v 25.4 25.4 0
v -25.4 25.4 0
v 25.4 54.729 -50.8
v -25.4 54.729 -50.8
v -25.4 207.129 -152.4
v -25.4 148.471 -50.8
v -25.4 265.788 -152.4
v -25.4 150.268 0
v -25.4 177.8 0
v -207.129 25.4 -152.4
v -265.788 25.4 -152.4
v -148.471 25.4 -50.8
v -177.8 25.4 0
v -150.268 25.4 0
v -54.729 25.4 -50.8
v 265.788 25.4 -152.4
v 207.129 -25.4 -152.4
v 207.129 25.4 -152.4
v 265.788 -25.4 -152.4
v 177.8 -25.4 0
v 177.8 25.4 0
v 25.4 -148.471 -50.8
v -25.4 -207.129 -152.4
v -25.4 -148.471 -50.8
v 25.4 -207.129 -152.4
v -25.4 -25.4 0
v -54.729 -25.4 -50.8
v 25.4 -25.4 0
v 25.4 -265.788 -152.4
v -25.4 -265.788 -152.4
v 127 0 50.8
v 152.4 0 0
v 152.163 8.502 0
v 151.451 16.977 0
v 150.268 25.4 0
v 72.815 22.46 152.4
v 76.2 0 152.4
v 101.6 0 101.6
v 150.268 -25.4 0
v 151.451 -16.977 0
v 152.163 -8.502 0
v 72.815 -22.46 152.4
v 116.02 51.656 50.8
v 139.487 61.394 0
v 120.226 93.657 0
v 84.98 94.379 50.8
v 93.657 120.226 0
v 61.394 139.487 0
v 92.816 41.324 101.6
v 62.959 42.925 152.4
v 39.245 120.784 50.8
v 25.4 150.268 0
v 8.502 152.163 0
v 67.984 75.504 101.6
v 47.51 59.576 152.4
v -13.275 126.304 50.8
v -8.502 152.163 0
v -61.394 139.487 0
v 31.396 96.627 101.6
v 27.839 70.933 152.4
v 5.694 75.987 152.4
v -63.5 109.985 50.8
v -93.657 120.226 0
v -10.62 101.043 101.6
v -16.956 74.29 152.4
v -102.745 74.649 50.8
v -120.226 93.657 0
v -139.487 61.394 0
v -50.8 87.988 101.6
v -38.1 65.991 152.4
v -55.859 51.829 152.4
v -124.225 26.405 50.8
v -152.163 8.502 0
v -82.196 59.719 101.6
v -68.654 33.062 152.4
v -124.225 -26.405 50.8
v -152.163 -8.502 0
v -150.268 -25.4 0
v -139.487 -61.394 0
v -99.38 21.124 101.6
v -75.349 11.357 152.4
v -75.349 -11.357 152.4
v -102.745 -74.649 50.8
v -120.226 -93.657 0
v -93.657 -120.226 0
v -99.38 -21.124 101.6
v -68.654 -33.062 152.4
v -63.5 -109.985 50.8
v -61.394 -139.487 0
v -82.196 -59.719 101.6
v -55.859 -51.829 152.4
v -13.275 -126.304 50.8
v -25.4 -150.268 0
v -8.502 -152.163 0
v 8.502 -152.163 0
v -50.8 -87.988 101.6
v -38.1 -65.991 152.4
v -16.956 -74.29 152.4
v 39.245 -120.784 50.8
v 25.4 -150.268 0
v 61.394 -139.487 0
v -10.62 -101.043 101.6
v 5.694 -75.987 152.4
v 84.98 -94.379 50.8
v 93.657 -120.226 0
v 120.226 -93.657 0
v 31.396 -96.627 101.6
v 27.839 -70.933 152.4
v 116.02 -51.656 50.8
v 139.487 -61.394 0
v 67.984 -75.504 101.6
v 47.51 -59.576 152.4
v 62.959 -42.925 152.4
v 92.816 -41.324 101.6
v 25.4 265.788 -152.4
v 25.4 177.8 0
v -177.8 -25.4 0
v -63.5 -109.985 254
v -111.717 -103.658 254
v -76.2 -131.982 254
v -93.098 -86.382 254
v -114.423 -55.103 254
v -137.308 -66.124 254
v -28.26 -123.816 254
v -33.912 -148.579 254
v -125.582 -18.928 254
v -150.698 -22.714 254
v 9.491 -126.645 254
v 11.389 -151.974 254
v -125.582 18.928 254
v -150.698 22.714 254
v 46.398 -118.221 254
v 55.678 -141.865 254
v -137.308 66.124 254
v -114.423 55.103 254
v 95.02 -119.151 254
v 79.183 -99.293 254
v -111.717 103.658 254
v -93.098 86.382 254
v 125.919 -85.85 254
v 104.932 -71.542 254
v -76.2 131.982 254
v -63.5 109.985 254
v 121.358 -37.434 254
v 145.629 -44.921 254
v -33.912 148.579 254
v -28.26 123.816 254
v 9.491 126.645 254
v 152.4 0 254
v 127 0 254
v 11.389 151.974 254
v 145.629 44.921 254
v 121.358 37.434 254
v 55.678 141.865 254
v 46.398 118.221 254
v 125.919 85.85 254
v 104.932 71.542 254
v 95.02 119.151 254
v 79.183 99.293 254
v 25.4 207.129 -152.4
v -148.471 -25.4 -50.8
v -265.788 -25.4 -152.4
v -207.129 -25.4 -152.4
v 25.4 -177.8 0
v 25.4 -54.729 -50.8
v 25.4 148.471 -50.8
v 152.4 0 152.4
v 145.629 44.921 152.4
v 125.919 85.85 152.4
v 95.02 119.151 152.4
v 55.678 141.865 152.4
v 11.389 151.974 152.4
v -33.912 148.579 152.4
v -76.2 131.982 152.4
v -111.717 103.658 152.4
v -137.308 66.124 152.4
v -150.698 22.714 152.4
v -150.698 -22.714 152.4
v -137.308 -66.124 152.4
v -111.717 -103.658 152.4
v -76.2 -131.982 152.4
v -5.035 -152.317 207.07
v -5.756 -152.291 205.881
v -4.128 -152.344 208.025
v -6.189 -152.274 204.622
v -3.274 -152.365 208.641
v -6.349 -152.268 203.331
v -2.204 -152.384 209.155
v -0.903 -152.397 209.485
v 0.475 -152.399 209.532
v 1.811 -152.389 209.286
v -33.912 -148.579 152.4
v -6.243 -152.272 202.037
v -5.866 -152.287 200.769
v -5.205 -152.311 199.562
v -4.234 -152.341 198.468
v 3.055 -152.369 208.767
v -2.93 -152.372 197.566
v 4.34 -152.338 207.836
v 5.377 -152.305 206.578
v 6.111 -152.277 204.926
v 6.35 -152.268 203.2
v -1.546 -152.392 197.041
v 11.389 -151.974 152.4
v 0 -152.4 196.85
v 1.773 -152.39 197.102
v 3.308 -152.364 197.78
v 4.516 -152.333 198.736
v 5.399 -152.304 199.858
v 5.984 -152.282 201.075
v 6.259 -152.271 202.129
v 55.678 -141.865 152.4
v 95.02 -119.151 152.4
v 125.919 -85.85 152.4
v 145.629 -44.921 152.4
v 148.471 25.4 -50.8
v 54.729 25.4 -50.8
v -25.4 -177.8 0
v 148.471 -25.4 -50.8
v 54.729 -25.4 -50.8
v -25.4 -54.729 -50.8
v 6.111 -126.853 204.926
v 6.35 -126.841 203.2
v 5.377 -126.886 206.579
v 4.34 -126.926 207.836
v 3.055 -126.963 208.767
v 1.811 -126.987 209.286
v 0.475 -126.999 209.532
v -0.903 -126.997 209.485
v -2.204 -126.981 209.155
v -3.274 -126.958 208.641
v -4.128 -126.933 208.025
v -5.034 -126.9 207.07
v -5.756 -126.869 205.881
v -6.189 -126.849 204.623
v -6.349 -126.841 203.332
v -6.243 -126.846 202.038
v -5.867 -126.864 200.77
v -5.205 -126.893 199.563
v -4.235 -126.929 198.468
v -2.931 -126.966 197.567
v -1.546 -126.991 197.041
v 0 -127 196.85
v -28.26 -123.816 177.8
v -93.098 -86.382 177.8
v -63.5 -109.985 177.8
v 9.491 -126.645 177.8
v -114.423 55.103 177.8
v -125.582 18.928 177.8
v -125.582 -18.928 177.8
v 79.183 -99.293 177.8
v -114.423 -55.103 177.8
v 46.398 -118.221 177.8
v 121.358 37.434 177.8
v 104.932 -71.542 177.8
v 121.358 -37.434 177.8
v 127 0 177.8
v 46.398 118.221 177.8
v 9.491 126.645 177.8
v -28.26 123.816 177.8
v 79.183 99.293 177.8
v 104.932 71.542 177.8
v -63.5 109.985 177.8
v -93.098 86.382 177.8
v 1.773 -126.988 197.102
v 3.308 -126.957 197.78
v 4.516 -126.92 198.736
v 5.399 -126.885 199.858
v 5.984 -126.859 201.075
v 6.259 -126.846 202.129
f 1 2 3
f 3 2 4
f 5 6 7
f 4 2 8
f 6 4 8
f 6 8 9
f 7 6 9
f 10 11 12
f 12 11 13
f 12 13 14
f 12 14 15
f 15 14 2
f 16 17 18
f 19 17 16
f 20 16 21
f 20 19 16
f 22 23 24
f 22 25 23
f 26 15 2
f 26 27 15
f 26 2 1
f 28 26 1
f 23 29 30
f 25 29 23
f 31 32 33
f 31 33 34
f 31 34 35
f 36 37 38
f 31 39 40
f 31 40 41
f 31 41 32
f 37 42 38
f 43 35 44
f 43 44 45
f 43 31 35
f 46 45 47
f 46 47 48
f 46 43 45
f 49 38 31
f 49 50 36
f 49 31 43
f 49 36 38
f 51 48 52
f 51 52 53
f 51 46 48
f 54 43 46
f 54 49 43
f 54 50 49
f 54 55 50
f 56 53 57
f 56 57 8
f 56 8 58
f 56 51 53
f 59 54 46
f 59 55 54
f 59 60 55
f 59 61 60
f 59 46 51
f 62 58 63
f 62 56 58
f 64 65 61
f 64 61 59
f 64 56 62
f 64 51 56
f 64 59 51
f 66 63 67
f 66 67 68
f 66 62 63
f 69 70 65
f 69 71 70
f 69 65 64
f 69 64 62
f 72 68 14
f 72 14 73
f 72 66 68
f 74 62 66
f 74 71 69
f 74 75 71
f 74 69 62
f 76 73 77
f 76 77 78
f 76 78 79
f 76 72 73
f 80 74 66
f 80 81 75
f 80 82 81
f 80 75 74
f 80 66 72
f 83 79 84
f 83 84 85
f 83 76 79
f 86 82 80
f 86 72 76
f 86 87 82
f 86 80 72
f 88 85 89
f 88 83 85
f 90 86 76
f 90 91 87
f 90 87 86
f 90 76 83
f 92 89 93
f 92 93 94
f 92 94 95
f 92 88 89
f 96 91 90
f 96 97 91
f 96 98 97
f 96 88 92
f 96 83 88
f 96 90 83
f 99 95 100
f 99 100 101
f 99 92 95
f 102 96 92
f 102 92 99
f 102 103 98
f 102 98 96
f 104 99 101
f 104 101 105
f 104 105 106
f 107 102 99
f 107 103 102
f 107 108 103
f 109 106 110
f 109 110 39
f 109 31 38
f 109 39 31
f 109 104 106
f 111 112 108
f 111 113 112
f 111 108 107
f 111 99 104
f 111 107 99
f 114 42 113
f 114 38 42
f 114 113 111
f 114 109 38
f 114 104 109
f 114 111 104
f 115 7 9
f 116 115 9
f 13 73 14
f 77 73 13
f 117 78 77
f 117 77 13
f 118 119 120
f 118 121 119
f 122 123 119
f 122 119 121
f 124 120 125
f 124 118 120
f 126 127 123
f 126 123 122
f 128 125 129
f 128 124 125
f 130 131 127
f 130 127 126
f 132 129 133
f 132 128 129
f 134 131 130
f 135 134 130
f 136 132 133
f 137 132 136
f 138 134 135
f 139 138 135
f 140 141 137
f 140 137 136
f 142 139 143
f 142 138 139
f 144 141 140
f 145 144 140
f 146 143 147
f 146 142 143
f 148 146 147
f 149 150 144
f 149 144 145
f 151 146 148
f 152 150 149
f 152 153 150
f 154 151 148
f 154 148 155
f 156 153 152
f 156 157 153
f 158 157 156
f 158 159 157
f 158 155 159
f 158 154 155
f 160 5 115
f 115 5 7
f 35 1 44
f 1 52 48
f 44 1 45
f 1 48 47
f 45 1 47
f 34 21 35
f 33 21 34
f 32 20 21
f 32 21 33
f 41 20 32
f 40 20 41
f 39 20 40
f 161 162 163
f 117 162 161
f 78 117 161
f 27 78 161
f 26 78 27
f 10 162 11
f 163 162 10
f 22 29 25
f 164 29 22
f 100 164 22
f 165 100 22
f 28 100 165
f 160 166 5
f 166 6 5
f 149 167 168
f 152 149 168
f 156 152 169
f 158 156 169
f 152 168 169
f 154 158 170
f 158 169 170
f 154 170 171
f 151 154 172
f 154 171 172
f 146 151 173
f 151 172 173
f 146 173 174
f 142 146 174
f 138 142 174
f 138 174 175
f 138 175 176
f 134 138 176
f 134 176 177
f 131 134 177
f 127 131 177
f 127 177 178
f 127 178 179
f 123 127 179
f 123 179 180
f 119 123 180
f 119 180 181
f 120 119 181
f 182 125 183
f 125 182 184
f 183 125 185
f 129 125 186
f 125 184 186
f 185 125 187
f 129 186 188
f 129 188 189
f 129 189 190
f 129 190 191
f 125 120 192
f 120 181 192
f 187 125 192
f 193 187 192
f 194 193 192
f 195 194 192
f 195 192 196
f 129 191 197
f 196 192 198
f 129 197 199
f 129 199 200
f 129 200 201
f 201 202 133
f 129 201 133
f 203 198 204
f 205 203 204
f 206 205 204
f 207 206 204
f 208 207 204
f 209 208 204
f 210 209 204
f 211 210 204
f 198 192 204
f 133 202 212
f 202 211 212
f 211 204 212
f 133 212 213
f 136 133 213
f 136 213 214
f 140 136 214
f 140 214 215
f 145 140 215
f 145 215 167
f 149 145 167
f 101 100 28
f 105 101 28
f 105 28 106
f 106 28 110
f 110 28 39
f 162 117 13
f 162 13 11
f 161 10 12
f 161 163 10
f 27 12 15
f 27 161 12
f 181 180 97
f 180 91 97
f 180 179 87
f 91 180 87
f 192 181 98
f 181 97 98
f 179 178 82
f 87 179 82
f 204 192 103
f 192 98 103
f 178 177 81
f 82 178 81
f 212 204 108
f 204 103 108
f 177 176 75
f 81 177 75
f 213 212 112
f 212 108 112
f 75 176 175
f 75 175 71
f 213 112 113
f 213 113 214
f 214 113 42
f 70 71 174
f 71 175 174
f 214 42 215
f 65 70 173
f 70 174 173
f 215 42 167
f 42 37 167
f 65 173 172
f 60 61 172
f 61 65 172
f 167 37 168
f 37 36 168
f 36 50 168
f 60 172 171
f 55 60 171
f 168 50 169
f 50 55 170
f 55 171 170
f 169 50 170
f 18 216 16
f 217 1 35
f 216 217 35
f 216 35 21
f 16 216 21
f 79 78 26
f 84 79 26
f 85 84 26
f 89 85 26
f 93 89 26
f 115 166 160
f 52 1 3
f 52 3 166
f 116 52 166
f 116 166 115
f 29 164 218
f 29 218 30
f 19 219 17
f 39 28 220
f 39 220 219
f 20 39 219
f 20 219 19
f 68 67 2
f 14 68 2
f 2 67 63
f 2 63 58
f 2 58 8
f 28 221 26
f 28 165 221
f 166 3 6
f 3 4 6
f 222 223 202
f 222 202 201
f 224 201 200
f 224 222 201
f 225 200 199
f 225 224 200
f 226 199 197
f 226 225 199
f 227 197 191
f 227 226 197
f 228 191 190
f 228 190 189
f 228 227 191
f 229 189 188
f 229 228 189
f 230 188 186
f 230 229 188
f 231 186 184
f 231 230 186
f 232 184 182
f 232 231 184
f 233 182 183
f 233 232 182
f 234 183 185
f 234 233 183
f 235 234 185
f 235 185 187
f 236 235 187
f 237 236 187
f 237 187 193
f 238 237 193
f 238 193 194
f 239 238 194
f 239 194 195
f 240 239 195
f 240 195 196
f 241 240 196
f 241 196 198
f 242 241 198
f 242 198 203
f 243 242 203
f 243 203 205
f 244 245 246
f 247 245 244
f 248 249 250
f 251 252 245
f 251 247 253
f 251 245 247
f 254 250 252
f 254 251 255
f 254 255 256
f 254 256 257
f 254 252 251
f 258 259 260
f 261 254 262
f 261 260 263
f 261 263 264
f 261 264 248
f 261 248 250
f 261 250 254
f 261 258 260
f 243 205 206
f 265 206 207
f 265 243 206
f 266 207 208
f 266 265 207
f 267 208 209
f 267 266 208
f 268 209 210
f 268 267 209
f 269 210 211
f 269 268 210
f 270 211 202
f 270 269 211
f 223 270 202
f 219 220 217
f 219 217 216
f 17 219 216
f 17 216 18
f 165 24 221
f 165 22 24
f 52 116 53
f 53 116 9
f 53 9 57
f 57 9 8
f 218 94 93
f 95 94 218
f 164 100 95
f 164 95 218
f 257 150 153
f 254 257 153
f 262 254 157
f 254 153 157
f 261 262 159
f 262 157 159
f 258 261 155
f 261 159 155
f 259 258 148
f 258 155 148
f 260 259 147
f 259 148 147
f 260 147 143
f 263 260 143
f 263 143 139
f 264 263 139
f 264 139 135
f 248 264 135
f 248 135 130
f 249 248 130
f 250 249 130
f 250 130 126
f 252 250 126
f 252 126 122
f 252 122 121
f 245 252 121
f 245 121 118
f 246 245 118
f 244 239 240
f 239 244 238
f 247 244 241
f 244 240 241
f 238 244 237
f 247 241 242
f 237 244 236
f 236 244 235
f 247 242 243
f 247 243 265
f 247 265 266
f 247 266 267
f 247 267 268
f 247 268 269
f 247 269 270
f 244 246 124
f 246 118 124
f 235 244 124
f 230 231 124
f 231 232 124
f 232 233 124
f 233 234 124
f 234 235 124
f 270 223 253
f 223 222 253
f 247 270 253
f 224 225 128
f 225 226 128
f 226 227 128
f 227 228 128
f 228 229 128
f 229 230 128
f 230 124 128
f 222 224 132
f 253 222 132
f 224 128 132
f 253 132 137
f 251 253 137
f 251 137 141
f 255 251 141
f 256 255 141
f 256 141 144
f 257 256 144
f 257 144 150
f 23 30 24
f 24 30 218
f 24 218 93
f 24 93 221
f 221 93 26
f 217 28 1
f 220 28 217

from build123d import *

# Parameters (mm, degrees)
F2_DEPTH  = 25.4
F3_DEPTH  = 25.4
F4_R      = 152.4
F6_R      = 76.2
F8_R      = 152.4
F8_R_2    = 76.2
F9_DEPTH  = 101.6
F10_R     = 127
F11_DEPTH = 76.2
F13_DEPTH = 265.7891810245


with BuildPart() as f2:
    # F0 (on Front) → F2 (new body, symmetric)
    with BuildSketch(Plane.XZ):
        Polygon((177.8, 0), (25.4, 0), (54.7293936748, -50.8), (148.4706063252, -50.8), (177.8, -50.8), align=None)
        Polygon((207.1293936748, -50.8), (177.8, 0), (177.8, -50.8), align=None)
        Polygon((177.8, -50.8), (148.4706063252, -50.8), (177.8, -101.6), align=None)
        Polygon((207.1293936748, -50.8), (177.8, -50.8), (177.8, -101.6), (207.1293936748, -152.4), (265.7881810245, -152.4), align=None)
    extrude(amount=F2_DEPTH, both=True)



with BuildPart() as f2b:
    # F0 (on Front) → F2, piece 2 (new body, symmetric)
    with BuildSketch(Plane.XZ):
        Polygon((-54.7293936748, -50.8), (-25.4, 0), (-177.8, 0), (-207.1293936748, -50.8), (-148.4706063252, -50.8), align=None)
        Polygon((-207.1293936748, -152.4), (-148.4706063252, -50.8), (-207.1293936748, -50.8), (-265.7881810245, -152.4), align=None)
    extrude(amount=F2_DEPTH, both=True)


with BuildPart() as f2_1:
    add(f2.part)

    add(f2b.part)  # F3 merges F2b
    # F1 (on Right) → F3 (join, symmetric)
    with BuildSketch(Plane.YZ):
        Polygon((177.8, 0), (25.4, 0), (54.7293936748, -50.8), (148.4706063252, -50.8), (177.8, -50.8), align=None)
        Polygon((-54.7293936748, -50.8), (-25.4, 0), (-177.8, 0), (-207.1293936748, -50.8), (-148.4706063252, -50.8), align=None)
        Polygon((207.1293936748, -50.8), (177.8, 0), (177.8, -50.8), align=None)
        Polygon((177.8, -50.8), (148.4706063252, -50.8), (177.8, -101.6), align=None)
        Polygon((207.1293936748, -50.8), (177.8, -50.8), (177.8, -101.6), (207.1293936748, -152.4), (222.5192777686, -152.4), (265.7881810245, -152.4), align=None)
        Polygon((-207.1293936748, -152.4), (-148.4706063252, -50.8), (-207.1293936748, -50.8), (-265.7881810245, -152.4), align=None)
    extrude(amount=F3_DEPTH, both=True)

    # F4 (on Top) → F7 section 0
    with BuildSketch(Plane.XY):
        Circle(F4_R)
    # F6 (on offset) → F7 section 1
    with BuildSketch(Plane.XY.offset(152.4)):
        Circle(F6_R)
    loft()

    # F8 (on face) → F9 (join)
    with BuildSketch(Plane.XY.offset(152.4)):
        Circle(F8_R)
        Circle(F8_R_2, mode=Mode.SUBTRACT)
        Circle(F8_R_2)
    extrude(amount=F9_DEPTH)

    # F10 (on face) → F11 (cut)
    with BuildSketch(Plane.XY.offset(254)):
        Circle(F10_R)
    extrude(amount=-F11_DEPTH, mode=Mode.SUBTRACT)

    # F12 (on Front) → F13 (cut, through all)
    with BuildSketch(Plane.XZ):
        with BuildLine():
            ThreePointArc((0, 196.85), (4.4901280605, 198.7098719395), (6.35, 203.2))
            ThreePointArc((6.35, 203.2), (-4.4901280605, 207.6901280605), (0, 196.85))
        make_face()
    extrude(amount=F13_DEPTH, mode=Mode.SUBTRACT)


solid = f2_1.part
